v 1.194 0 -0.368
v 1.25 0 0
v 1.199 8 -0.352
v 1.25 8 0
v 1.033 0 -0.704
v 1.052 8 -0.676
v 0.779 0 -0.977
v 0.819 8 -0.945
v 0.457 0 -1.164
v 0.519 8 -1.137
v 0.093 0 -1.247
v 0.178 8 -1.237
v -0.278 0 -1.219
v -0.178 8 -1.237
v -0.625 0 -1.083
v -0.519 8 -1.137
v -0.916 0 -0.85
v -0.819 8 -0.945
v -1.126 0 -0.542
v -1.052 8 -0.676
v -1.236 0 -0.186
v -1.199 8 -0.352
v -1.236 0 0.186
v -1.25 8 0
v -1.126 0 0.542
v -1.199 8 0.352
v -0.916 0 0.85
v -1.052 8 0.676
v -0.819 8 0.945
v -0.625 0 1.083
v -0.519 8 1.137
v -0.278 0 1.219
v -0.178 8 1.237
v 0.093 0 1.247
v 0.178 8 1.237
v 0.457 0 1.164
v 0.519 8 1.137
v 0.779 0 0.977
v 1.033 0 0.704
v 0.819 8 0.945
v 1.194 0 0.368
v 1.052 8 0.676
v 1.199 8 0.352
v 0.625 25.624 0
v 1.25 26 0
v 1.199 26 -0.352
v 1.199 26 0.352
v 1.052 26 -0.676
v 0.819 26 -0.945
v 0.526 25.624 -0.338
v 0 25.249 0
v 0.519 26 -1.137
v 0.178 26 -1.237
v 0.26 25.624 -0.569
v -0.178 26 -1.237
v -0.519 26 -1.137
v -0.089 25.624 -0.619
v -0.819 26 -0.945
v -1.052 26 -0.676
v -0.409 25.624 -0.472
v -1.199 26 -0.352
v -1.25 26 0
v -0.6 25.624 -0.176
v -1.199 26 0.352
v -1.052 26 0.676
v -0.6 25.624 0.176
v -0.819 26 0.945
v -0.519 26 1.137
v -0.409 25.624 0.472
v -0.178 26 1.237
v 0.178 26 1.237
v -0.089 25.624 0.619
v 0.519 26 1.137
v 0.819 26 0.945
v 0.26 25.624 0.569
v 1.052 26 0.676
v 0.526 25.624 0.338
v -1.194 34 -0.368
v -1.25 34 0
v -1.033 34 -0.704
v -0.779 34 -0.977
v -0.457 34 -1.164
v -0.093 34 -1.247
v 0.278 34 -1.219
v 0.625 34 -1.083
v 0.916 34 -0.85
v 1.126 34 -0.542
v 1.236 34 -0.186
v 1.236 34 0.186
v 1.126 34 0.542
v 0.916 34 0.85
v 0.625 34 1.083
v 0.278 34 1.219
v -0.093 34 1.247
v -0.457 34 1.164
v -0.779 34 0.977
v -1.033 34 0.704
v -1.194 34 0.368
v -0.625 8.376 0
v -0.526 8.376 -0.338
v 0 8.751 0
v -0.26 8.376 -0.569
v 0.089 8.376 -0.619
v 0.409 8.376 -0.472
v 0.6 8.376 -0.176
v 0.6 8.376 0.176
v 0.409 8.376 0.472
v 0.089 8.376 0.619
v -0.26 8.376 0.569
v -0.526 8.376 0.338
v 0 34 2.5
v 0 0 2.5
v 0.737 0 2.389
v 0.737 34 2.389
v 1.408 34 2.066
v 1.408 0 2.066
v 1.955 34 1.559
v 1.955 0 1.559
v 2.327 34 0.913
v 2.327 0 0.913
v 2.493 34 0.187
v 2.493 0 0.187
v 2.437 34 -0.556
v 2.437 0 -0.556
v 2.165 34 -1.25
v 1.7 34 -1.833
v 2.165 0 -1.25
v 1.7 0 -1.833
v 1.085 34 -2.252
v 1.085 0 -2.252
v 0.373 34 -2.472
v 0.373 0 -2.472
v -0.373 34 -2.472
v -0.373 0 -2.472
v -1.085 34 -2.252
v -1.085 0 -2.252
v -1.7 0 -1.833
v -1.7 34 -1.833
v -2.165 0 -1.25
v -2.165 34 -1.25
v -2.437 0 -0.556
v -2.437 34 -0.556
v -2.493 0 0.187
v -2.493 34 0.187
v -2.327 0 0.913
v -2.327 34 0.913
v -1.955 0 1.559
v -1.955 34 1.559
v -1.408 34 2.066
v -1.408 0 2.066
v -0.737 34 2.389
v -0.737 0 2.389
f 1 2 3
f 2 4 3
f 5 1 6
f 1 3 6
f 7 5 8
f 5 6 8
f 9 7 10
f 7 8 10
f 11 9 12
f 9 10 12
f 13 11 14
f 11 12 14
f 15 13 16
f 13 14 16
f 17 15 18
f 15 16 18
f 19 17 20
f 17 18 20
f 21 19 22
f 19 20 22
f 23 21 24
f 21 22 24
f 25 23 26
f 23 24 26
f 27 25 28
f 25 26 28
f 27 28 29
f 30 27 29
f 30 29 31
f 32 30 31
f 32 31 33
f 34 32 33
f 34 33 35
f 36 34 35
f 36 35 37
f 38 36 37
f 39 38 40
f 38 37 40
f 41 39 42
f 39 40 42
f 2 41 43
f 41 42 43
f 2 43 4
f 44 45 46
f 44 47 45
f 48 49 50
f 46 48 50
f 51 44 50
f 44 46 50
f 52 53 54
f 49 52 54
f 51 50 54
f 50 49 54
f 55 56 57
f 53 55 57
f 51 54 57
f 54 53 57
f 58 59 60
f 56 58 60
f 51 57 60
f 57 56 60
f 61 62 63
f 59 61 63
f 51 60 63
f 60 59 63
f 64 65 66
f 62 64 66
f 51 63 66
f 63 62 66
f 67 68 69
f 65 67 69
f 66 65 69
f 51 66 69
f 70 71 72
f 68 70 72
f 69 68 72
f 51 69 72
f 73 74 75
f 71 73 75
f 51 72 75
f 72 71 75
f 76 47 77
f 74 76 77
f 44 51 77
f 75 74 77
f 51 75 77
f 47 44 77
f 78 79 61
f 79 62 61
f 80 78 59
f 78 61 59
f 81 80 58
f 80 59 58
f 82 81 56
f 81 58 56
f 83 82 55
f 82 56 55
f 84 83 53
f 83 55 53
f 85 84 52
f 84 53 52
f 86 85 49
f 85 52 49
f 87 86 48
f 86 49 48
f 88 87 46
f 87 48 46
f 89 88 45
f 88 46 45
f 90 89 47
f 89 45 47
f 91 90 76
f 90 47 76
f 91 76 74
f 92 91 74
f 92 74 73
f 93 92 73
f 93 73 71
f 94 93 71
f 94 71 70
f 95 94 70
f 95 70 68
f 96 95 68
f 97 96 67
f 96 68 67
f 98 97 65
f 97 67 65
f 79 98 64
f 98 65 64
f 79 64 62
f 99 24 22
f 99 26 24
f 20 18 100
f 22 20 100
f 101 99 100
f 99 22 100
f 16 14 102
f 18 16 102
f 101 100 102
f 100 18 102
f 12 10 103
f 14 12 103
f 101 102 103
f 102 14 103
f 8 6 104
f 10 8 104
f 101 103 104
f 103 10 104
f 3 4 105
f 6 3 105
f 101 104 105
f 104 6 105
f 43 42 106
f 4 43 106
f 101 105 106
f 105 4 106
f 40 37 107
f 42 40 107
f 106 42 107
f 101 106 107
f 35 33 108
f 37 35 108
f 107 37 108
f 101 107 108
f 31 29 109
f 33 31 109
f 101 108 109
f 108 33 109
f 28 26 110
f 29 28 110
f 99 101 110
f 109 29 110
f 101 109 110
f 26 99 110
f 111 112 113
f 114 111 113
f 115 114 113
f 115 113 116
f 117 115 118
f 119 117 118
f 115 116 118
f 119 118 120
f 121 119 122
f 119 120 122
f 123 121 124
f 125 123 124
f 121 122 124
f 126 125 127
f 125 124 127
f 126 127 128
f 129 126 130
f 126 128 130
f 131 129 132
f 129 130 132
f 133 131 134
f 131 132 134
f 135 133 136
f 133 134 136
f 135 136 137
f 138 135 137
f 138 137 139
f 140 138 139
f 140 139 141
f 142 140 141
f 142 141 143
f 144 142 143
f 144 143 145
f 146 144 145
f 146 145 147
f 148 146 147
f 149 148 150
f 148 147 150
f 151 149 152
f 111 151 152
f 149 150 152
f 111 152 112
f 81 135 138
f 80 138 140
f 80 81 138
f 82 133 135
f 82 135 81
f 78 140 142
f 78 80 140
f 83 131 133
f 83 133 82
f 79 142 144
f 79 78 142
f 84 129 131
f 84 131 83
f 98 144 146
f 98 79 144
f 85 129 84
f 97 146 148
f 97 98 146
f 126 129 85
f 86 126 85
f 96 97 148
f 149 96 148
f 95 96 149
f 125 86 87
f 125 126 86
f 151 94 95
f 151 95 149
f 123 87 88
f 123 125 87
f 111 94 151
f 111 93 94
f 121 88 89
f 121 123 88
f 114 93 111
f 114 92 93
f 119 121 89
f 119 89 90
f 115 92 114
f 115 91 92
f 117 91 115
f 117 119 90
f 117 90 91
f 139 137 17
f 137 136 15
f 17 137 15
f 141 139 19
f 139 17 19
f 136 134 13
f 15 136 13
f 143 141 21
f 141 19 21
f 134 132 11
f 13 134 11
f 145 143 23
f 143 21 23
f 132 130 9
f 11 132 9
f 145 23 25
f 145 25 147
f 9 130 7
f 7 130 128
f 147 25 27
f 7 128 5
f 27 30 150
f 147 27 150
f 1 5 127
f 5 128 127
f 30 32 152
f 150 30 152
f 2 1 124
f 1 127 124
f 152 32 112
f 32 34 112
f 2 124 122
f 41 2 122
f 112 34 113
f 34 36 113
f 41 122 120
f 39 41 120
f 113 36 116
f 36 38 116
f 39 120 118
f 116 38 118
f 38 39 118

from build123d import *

# Parameters (mm, degrees)
SKETCH1_R                   = 2.5
BOSS_EXTRUDE1_DEPTH         = 34
TAP_DRILL_FOR_M3_TAP1_D     = 2.5
TAP_DRILL_FOR_M3_TAP1_DEPTH = 8
TAP_DRILL_FOR_M3_TAP1_TIP   = 0.751075774
TAP_DRILL_FOR_M3_TAP2_D     = 2.5
TAP_DRILL_FOR_M3_TAP2_DEPTH = 8
TAP_DRILL_FOR_M3_TAP2_TIP   = 0.751075774


with BuildPart() as part:
    # Sketch1 → Boss-Extrude1 (new body)
    with BuildSketch(Plane(origin=(0, 0, 0), x_dir=(1, 0, 0), z_dir=(0, 1, 0))):
        with Locations(Location((0, 0, 0), (0, 0, 270))):
            Circle(SKETCH1_R)
    extrude(amount=BOSS_EXTRUDE1_DEPTH)

    # Tap Drill for M3 Tap1
    with Locations(Plane(origin=(0, 34, 0), x_dir=(1, 0, 0), z_dir=(0, 1, 0))):
        with Locations((0, 0)):
            Hole(TAP_DRILL_FOR_M3_TAP1_D / 2, depth=TAP_DRILL_FOR_M3_TAP1_DEPTH)
            with Locations((0, 0, -(TAP_DRILL_FOR_M3_TAP1_DEPTH + TAP_DRILL_FOR_M3_TAP1_TIP / 2))):  # 118° drill point
                Cone(0, TAP_DRILL_FOR_M3_TAP1_D / 2, TAP_DRILL_FOR_M3_TAP1_TIP, mode=Mode.SUBTRACT)

    # Tap Drill for M3 Tap2
    with Locations(Plane(origin=(0, 0, 0), x_dir=(-1, 0, 0), z_dir=(0, -1, 0))):
        with Locations((0, 0)):
            Hole(TAP_DRILL_FOR_M3_TAP2_D / 2, depth=TAP_DRILL_FOR_M3_TAP2_DEPTH)
            with Locations((0, 0, -(TAP_DRILL_FOR_M3_TAP2_DEPTH + TAP_DRILL_FOR_M3_TAP2_TIP / 2))):  # 118° drill point
                Cone(0, TAP_DRILL_FOR_M3_TAP2_D / 2, TAP_DRILL_FOR_M3_TAP2_TIP, mode=Mode.SUBTRACT)


solid = part.part
